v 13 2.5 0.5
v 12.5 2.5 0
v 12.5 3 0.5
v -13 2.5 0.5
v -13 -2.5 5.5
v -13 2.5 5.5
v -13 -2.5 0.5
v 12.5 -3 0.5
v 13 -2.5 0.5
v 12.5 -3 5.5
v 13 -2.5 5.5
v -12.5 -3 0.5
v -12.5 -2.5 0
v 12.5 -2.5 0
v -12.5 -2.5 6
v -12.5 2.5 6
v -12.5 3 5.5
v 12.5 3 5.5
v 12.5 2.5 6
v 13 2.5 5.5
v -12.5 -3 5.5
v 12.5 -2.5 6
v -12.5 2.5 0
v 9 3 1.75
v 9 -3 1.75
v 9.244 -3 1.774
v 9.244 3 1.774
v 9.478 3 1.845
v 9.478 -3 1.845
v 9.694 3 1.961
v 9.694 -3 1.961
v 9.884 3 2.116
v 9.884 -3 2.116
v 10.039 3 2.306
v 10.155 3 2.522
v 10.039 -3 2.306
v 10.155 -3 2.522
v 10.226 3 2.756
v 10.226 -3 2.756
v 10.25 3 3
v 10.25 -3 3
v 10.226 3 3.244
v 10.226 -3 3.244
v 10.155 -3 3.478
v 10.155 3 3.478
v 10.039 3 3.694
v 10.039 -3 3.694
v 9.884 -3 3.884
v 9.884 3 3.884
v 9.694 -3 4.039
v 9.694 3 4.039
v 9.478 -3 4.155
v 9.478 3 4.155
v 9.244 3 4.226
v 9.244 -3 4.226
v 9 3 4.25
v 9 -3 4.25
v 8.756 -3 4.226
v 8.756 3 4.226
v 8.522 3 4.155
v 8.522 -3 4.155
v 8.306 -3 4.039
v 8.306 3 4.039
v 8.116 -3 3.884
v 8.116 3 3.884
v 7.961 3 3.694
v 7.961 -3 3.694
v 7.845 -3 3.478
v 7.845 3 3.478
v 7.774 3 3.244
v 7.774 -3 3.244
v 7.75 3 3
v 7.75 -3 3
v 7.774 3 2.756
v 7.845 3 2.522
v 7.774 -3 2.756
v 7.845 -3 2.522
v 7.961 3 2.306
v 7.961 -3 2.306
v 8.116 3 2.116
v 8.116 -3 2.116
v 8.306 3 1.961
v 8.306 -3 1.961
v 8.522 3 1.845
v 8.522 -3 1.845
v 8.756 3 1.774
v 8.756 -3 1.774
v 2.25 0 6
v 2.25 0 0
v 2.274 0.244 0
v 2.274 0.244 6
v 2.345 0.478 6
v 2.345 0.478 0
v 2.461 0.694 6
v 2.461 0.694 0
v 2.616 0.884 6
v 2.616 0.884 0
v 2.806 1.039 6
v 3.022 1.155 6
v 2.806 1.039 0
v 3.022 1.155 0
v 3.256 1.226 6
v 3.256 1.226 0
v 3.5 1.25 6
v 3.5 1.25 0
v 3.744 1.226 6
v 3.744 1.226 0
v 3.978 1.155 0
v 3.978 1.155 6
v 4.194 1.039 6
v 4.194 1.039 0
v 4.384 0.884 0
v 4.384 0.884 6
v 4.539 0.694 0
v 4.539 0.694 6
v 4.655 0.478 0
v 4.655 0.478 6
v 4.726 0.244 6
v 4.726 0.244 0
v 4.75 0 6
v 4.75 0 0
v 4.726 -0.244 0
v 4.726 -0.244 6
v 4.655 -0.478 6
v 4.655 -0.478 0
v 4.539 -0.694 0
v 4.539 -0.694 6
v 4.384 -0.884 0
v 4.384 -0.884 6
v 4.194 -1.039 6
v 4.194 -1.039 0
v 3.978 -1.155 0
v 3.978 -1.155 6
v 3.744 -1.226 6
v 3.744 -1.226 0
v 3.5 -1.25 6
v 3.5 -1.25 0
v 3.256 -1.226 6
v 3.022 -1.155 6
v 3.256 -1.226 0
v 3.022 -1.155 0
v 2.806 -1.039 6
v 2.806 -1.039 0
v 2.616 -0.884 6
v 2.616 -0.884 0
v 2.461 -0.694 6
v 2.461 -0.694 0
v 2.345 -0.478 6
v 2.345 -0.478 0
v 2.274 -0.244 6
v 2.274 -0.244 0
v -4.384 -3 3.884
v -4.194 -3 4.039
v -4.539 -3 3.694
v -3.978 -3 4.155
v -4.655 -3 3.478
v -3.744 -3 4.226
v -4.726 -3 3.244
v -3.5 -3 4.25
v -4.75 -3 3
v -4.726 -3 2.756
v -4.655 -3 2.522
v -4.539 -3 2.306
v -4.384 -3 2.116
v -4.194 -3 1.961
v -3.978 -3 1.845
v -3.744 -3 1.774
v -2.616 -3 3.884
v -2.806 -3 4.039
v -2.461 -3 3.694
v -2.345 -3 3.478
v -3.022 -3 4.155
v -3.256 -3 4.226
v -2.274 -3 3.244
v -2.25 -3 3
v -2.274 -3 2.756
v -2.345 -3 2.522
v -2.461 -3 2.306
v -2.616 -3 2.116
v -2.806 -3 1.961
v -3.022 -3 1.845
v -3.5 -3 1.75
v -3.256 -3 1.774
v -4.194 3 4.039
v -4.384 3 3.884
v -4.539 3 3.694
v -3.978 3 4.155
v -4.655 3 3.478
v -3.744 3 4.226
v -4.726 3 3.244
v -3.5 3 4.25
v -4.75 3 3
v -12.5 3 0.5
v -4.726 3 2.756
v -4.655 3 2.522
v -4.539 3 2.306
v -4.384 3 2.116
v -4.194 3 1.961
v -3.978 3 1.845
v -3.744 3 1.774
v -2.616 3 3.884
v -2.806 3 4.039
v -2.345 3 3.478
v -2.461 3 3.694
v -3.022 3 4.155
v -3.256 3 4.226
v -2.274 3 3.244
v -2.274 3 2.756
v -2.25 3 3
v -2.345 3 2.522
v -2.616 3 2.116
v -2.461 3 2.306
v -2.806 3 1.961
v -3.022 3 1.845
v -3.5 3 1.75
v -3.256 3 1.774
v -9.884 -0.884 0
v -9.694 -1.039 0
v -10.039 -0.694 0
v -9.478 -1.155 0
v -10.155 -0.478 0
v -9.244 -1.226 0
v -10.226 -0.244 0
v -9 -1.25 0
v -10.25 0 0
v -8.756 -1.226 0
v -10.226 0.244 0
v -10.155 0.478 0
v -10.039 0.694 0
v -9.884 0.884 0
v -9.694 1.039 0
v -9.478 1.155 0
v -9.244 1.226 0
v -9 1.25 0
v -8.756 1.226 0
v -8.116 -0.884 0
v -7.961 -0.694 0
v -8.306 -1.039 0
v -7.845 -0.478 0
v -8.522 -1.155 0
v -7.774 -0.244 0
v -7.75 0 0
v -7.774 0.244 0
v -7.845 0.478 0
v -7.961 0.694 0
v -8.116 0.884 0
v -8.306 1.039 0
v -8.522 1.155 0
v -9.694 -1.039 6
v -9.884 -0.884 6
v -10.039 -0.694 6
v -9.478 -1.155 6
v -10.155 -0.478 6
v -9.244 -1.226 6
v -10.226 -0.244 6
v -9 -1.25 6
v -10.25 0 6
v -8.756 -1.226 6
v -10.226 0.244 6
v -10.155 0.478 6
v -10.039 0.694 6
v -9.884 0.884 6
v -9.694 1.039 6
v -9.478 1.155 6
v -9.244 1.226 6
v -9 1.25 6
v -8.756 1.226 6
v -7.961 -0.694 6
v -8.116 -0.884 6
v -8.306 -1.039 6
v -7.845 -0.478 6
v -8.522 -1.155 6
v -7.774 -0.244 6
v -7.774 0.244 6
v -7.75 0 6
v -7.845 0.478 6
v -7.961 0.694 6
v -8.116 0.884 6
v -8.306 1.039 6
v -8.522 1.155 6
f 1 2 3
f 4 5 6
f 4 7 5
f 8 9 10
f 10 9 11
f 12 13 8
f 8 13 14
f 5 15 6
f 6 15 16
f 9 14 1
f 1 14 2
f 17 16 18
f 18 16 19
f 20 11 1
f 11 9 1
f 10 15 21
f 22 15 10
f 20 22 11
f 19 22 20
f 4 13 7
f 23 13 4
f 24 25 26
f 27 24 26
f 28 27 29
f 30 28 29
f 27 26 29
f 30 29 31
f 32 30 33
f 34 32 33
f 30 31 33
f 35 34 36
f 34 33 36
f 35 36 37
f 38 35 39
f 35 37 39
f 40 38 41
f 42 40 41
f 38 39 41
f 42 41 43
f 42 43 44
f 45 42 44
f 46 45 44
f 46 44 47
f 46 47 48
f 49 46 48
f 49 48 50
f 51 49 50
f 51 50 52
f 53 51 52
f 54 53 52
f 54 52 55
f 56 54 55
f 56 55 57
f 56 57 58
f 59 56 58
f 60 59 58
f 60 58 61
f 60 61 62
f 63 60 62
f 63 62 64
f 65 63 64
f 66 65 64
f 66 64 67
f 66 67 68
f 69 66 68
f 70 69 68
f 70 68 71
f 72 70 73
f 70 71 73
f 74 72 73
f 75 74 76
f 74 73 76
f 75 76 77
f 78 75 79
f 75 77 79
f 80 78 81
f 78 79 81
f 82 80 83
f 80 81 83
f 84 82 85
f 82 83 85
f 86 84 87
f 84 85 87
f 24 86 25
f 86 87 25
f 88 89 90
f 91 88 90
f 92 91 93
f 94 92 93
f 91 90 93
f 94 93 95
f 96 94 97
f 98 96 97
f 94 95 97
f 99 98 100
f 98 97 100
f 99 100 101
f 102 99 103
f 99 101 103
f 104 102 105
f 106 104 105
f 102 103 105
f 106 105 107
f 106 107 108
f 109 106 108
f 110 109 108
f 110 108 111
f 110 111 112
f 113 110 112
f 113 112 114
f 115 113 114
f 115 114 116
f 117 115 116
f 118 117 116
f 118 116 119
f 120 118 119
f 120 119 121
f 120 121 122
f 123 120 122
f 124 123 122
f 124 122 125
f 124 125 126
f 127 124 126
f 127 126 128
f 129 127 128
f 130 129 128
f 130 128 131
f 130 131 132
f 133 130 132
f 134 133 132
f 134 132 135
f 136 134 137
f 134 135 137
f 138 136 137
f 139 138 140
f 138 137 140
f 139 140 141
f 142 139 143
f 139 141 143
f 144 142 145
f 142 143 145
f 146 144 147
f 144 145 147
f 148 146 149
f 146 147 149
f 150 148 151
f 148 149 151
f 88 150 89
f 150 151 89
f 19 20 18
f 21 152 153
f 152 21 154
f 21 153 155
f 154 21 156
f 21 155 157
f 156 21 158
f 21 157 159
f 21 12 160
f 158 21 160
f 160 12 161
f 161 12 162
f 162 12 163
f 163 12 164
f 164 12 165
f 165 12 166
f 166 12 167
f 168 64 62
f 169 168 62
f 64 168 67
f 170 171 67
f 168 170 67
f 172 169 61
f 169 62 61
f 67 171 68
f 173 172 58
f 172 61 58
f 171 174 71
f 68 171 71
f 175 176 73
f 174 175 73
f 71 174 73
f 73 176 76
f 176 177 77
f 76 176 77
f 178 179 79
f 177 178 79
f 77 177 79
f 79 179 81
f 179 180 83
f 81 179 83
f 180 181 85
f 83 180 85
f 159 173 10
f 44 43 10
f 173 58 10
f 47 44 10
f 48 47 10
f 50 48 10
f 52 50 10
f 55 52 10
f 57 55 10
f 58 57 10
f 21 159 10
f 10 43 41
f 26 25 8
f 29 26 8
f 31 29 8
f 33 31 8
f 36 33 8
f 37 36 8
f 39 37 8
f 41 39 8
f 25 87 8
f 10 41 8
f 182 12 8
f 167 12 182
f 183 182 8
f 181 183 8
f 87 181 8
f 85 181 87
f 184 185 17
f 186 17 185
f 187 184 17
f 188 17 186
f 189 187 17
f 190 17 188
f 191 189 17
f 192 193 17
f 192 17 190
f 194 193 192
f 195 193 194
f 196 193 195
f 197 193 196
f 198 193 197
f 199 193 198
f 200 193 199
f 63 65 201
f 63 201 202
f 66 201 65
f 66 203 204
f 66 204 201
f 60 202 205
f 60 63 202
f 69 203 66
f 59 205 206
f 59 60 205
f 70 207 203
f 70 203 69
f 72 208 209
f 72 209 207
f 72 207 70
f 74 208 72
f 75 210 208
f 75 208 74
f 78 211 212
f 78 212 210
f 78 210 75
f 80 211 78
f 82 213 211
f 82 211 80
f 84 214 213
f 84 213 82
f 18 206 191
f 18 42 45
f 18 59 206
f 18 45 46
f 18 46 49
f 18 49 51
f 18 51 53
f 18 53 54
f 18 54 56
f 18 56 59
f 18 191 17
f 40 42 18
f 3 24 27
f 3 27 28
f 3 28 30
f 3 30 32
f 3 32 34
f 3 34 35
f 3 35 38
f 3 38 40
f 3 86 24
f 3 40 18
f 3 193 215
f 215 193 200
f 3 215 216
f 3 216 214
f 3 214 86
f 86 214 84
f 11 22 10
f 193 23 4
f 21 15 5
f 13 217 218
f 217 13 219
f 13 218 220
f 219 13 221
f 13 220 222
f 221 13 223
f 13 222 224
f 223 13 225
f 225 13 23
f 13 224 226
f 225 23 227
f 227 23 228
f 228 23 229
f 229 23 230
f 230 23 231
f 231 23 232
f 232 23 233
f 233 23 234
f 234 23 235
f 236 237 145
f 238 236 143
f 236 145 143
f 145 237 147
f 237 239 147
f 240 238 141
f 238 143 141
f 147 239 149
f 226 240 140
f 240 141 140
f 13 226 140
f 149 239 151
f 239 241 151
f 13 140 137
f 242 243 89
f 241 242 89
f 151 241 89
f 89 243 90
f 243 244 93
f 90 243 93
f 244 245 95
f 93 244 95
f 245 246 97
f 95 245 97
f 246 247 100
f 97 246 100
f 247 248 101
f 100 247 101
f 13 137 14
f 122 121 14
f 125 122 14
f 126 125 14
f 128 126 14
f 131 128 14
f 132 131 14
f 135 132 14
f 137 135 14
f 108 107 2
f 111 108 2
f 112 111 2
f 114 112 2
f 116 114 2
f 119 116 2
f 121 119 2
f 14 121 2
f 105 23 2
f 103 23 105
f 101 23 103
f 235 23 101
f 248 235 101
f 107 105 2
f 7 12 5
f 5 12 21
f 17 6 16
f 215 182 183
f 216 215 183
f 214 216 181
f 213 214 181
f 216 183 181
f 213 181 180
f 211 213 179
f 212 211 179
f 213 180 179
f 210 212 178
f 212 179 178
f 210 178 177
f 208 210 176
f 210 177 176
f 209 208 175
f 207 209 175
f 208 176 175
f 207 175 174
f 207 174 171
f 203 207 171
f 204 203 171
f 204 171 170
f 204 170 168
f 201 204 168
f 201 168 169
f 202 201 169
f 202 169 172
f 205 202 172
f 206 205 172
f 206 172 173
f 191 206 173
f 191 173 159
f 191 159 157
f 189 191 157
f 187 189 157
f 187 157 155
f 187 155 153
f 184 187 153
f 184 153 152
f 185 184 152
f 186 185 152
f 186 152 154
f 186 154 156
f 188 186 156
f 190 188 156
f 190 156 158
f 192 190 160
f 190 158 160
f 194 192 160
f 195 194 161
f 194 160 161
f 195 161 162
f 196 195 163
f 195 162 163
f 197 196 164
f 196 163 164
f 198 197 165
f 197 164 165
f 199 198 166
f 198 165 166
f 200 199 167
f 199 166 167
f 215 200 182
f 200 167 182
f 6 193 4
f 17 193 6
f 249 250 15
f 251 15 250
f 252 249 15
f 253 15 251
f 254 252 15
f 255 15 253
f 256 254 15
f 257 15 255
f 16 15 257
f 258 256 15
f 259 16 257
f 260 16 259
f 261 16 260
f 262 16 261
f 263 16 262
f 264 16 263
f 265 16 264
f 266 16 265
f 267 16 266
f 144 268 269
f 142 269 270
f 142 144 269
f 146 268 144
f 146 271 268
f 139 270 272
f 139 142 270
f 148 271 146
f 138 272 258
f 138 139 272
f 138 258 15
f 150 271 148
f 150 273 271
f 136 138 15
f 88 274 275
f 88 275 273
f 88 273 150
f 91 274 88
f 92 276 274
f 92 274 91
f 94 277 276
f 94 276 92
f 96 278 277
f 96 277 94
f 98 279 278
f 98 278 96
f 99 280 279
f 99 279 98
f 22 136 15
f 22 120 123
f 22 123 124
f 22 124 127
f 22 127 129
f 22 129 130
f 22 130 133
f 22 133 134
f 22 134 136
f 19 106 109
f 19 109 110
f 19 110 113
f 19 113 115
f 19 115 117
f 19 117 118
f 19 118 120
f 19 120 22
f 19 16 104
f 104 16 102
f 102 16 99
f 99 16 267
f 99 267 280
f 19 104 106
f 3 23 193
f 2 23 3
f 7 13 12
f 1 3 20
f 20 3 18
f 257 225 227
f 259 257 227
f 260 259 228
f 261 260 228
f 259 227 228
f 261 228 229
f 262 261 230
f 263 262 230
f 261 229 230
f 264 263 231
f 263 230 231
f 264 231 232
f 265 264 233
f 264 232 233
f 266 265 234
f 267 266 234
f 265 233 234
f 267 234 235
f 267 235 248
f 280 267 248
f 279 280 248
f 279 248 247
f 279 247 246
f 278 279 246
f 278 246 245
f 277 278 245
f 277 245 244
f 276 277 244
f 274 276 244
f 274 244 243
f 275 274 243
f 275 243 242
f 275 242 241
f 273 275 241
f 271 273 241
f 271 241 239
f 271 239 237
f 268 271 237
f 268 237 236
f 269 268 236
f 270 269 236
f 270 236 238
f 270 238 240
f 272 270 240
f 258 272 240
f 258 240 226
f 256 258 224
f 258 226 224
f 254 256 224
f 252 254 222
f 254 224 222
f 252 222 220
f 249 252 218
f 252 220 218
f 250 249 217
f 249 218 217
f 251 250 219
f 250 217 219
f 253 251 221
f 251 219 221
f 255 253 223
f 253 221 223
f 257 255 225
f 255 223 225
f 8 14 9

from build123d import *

# Parameters (mm, degrees)
SKETCH_1_W         = 26
SKETCH_1_H         = 6
EXTRUDE_1_DEPTH    = 6
CHAMFER_1_SIZE     = 0.5
HOLE_WIZARD_M3_1_D = 2.5
HOLE_WIZARD_M3_2_D = 2.5


with BuildPart() as part:
    # 草图1 → 凸台-拉伸1 (new body)
    with BuildSketch(Plane.XY):
        Rectangle(SKETCH_1_W, SKETCH_1_H)
    extrude(amount=EXTRUDE_1_DEPTH)

    # 倒角1
    chamfer_1_edges = [part.edges().sort_by_distance(p)[0] for p in [
        (-13, 0, 6),
        (0, -3, 6),
        (13, 0, 6),
        (0, -3, 0),
        (-13, 0, 0),
        (0, 3, 0),
        (13, 0, 0),
        (13, -3, 3),
        (-13, -3, 3),
        (-13, 3, 3),
        (13, 3, 3),
        (0, 3, 6),
    ]]
    chamfer(chamfer_1_edges, length=CHAMFER_1_SIZE)

    # M3 螺纹孔1 (through all)
    with Locations(Plane(origin=(-9, 0, 6), x_dir=(1, 0, 0), z_dir=(0, 0, 1))):
        with Locations((0, 0), (12.5, 0)):
            Hole(HOLE_WIZARD_M3_1_D / 2)

    # M3 螺纹孔2 (through all)
    with Locations(Plane(origin=(-3.5, 3, 3), x_dir=(0, 0, 1), z_dir=(0, 1, 0))):
        with Locations((0, 0), (0, 12.5)):
            Hole(HOLE_WIZARD_M3_2_D / 2)


solid = part.part
